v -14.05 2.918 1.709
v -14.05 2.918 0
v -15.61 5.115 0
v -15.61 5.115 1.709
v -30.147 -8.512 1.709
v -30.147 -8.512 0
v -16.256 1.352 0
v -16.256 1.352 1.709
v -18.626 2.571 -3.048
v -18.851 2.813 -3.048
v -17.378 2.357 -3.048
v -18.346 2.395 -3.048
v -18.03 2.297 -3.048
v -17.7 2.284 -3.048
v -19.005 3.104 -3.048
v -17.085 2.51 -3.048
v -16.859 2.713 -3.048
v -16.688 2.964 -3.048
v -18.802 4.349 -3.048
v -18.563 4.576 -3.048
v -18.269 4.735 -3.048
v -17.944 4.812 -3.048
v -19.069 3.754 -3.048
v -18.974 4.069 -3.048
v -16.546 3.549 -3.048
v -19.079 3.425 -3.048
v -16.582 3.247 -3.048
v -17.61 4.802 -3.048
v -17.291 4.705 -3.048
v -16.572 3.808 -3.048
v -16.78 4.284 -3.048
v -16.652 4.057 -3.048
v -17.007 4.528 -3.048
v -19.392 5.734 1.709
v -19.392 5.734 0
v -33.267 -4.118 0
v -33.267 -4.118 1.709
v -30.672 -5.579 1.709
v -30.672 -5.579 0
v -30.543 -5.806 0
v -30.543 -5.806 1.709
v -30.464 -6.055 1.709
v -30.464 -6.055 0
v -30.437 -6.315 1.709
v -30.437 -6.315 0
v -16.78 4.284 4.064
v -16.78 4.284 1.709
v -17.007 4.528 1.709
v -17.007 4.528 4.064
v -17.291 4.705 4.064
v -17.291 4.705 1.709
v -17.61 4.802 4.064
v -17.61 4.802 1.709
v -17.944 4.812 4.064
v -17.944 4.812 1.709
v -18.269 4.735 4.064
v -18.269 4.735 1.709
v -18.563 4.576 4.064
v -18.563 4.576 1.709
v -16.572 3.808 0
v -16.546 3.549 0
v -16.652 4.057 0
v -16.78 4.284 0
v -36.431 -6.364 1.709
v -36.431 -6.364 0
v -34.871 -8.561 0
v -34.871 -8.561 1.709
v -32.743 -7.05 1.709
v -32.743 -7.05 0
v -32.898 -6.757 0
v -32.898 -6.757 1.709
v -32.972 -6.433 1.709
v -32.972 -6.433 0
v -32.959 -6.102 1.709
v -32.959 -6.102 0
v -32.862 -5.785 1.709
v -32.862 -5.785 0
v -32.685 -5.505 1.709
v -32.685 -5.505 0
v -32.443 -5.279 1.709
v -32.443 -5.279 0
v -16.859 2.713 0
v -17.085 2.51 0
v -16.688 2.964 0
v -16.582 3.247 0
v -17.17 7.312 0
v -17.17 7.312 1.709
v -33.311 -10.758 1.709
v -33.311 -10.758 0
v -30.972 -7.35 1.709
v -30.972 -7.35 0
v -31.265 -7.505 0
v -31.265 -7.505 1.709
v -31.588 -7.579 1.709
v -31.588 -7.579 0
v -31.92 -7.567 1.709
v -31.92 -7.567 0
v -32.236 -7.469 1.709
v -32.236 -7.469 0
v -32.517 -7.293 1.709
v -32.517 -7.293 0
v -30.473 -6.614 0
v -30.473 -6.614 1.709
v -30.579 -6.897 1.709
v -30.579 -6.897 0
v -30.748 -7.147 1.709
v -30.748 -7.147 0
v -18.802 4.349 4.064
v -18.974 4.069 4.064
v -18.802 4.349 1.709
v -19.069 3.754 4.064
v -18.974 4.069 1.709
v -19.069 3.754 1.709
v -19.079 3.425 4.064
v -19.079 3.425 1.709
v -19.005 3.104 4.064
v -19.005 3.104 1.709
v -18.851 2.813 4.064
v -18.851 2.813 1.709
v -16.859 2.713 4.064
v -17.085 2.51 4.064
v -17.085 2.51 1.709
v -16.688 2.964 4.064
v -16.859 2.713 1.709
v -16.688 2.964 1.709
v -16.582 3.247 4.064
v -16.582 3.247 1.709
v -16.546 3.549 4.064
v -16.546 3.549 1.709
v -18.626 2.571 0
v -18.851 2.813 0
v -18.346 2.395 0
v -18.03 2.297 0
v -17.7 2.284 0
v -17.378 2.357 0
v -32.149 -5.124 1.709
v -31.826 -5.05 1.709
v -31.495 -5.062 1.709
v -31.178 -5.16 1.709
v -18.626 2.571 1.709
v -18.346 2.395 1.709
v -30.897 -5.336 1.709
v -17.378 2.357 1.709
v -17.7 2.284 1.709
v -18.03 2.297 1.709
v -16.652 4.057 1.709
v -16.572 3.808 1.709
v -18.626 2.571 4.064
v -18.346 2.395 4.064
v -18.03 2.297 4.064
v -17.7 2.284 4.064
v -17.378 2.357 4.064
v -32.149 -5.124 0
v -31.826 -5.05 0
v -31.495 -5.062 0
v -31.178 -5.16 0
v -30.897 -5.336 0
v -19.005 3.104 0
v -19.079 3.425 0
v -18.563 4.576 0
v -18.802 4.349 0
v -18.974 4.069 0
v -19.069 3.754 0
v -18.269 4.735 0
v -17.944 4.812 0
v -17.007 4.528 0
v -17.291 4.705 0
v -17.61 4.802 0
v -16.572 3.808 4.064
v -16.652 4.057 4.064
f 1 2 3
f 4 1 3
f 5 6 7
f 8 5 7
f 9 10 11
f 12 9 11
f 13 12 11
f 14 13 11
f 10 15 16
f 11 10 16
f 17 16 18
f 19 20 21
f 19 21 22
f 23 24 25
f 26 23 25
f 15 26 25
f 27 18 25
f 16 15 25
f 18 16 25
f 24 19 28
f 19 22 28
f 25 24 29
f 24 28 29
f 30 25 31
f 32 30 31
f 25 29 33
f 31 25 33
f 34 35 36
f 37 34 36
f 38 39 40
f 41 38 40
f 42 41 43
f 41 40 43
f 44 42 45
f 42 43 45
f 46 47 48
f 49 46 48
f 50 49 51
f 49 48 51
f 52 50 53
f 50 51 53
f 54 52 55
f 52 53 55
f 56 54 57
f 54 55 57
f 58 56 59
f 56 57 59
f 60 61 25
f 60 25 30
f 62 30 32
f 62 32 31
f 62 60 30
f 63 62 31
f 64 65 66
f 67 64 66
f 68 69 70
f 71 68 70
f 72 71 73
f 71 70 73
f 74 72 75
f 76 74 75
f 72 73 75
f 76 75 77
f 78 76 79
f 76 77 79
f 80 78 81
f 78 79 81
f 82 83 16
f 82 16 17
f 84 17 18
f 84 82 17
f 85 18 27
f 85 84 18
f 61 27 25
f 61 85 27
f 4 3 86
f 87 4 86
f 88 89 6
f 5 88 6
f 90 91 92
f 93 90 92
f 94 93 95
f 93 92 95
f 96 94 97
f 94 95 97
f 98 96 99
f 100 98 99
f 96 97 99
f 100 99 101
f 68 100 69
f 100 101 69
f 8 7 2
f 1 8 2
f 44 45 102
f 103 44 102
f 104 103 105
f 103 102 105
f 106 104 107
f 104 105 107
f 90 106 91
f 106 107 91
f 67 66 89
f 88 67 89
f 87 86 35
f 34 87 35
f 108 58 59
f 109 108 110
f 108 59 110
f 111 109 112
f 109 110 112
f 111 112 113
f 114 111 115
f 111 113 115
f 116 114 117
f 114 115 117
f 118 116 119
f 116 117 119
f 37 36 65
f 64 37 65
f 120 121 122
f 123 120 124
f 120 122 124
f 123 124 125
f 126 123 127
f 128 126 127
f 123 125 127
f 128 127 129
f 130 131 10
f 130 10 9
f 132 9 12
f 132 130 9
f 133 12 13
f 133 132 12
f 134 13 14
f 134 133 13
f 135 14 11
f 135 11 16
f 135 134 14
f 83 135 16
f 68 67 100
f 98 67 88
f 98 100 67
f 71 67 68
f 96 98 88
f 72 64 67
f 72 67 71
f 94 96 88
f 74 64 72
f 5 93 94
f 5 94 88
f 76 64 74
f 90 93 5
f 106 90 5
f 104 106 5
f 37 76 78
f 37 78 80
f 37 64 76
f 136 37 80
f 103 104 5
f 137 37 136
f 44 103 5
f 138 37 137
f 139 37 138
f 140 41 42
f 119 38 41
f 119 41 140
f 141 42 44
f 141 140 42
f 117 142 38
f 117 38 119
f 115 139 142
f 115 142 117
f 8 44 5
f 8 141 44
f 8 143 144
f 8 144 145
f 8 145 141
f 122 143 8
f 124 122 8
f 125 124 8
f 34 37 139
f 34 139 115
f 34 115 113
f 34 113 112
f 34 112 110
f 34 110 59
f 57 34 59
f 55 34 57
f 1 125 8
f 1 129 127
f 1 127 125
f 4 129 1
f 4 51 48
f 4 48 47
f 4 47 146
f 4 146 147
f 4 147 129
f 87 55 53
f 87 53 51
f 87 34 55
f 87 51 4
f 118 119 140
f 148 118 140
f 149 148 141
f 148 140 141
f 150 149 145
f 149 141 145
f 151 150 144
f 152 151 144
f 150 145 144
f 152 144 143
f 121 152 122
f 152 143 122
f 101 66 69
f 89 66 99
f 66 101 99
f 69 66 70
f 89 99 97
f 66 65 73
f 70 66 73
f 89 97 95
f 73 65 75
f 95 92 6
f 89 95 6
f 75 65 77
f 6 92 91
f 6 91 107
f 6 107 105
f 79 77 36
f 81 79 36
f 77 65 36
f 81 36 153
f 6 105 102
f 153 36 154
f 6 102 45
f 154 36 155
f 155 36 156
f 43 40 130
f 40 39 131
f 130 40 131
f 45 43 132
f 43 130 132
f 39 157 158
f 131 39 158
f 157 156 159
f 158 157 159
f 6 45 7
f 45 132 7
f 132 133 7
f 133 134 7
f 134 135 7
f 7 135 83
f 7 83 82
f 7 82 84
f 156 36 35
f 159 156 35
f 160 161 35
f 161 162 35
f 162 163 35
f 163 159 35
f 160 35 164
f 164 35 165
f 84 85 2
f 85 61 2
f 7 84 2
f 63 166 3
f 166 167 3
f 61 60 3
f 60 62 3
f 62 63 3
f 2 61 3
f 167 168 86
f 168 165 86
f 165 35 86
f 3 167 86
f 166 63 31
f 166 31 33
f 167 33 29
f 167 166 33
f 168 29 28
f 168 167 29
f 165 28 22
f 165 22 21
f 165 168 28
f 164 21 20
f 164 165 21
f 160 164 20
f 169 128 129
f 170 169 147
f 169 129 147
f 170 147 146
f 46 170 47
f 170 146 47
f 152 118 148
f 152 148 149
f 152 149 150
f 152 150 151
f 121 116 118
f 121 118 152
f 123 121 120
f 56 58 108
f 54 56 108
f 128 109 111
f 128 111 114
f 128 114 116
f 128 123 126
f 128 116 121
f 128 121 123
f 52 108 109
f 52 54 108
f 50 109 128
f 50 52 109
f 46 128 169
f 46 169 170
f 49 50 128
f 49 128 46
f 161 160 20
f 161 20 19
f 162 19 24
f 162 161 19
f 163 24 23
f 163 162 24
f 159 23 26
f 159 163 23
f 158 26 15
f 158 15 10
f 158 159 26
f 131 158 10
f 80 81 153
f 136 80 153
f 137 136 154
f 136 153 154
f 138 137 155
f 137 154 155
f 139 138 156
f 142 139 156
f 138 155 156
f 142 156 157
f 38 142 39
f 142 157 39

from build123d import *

# Parameters (mm, degrees)
SKETCH1_R                = 1.27
BOSS_EXTRUDE6_DEPTH      = 1.70891122
BOSS_EXTRUDE7_DEPTH      = 4.064
BOSS_EXTRUDE7_DEPTH_BACK = 3.048
SKETCH1_8_R              = 1.27


with BuildPart() as part:
    # Sketch1 → Boss-Extrude6 (new body)
    with BuildSketch(Plane.XY):
        Polygon((-36.430695542, -6.363620451), (-33.310929263, -10.757657465), (-14.0499524, 2.917636108), (-17.16971868, 7.311673121), align=None)
        with Locations((-31.707269185, -6.314523273)):
            Circle(SKETCH1_R, mode=Mode.SUBTRACT)
    extrude(amount=BOSS_EXTRUDE6_DEPTH)

    # Sketch1<8> → Boss-Extrude7 (add, two sides: drawn at the far end of the back side and taken through both)
    with BuildSketch(Plane.XY.offset(-BOSS_EXTRUDE7_DEPTH_BACK)):
        with Locations((-17.815528052, 3.548612931)):
            Circle(SKETCH1_8_R)
    extrude(amount=BOSS_EXTRUDE7_DEPTH + BOSS_EXTRUDE7_DEPTH_BACK)


solid = part.part
